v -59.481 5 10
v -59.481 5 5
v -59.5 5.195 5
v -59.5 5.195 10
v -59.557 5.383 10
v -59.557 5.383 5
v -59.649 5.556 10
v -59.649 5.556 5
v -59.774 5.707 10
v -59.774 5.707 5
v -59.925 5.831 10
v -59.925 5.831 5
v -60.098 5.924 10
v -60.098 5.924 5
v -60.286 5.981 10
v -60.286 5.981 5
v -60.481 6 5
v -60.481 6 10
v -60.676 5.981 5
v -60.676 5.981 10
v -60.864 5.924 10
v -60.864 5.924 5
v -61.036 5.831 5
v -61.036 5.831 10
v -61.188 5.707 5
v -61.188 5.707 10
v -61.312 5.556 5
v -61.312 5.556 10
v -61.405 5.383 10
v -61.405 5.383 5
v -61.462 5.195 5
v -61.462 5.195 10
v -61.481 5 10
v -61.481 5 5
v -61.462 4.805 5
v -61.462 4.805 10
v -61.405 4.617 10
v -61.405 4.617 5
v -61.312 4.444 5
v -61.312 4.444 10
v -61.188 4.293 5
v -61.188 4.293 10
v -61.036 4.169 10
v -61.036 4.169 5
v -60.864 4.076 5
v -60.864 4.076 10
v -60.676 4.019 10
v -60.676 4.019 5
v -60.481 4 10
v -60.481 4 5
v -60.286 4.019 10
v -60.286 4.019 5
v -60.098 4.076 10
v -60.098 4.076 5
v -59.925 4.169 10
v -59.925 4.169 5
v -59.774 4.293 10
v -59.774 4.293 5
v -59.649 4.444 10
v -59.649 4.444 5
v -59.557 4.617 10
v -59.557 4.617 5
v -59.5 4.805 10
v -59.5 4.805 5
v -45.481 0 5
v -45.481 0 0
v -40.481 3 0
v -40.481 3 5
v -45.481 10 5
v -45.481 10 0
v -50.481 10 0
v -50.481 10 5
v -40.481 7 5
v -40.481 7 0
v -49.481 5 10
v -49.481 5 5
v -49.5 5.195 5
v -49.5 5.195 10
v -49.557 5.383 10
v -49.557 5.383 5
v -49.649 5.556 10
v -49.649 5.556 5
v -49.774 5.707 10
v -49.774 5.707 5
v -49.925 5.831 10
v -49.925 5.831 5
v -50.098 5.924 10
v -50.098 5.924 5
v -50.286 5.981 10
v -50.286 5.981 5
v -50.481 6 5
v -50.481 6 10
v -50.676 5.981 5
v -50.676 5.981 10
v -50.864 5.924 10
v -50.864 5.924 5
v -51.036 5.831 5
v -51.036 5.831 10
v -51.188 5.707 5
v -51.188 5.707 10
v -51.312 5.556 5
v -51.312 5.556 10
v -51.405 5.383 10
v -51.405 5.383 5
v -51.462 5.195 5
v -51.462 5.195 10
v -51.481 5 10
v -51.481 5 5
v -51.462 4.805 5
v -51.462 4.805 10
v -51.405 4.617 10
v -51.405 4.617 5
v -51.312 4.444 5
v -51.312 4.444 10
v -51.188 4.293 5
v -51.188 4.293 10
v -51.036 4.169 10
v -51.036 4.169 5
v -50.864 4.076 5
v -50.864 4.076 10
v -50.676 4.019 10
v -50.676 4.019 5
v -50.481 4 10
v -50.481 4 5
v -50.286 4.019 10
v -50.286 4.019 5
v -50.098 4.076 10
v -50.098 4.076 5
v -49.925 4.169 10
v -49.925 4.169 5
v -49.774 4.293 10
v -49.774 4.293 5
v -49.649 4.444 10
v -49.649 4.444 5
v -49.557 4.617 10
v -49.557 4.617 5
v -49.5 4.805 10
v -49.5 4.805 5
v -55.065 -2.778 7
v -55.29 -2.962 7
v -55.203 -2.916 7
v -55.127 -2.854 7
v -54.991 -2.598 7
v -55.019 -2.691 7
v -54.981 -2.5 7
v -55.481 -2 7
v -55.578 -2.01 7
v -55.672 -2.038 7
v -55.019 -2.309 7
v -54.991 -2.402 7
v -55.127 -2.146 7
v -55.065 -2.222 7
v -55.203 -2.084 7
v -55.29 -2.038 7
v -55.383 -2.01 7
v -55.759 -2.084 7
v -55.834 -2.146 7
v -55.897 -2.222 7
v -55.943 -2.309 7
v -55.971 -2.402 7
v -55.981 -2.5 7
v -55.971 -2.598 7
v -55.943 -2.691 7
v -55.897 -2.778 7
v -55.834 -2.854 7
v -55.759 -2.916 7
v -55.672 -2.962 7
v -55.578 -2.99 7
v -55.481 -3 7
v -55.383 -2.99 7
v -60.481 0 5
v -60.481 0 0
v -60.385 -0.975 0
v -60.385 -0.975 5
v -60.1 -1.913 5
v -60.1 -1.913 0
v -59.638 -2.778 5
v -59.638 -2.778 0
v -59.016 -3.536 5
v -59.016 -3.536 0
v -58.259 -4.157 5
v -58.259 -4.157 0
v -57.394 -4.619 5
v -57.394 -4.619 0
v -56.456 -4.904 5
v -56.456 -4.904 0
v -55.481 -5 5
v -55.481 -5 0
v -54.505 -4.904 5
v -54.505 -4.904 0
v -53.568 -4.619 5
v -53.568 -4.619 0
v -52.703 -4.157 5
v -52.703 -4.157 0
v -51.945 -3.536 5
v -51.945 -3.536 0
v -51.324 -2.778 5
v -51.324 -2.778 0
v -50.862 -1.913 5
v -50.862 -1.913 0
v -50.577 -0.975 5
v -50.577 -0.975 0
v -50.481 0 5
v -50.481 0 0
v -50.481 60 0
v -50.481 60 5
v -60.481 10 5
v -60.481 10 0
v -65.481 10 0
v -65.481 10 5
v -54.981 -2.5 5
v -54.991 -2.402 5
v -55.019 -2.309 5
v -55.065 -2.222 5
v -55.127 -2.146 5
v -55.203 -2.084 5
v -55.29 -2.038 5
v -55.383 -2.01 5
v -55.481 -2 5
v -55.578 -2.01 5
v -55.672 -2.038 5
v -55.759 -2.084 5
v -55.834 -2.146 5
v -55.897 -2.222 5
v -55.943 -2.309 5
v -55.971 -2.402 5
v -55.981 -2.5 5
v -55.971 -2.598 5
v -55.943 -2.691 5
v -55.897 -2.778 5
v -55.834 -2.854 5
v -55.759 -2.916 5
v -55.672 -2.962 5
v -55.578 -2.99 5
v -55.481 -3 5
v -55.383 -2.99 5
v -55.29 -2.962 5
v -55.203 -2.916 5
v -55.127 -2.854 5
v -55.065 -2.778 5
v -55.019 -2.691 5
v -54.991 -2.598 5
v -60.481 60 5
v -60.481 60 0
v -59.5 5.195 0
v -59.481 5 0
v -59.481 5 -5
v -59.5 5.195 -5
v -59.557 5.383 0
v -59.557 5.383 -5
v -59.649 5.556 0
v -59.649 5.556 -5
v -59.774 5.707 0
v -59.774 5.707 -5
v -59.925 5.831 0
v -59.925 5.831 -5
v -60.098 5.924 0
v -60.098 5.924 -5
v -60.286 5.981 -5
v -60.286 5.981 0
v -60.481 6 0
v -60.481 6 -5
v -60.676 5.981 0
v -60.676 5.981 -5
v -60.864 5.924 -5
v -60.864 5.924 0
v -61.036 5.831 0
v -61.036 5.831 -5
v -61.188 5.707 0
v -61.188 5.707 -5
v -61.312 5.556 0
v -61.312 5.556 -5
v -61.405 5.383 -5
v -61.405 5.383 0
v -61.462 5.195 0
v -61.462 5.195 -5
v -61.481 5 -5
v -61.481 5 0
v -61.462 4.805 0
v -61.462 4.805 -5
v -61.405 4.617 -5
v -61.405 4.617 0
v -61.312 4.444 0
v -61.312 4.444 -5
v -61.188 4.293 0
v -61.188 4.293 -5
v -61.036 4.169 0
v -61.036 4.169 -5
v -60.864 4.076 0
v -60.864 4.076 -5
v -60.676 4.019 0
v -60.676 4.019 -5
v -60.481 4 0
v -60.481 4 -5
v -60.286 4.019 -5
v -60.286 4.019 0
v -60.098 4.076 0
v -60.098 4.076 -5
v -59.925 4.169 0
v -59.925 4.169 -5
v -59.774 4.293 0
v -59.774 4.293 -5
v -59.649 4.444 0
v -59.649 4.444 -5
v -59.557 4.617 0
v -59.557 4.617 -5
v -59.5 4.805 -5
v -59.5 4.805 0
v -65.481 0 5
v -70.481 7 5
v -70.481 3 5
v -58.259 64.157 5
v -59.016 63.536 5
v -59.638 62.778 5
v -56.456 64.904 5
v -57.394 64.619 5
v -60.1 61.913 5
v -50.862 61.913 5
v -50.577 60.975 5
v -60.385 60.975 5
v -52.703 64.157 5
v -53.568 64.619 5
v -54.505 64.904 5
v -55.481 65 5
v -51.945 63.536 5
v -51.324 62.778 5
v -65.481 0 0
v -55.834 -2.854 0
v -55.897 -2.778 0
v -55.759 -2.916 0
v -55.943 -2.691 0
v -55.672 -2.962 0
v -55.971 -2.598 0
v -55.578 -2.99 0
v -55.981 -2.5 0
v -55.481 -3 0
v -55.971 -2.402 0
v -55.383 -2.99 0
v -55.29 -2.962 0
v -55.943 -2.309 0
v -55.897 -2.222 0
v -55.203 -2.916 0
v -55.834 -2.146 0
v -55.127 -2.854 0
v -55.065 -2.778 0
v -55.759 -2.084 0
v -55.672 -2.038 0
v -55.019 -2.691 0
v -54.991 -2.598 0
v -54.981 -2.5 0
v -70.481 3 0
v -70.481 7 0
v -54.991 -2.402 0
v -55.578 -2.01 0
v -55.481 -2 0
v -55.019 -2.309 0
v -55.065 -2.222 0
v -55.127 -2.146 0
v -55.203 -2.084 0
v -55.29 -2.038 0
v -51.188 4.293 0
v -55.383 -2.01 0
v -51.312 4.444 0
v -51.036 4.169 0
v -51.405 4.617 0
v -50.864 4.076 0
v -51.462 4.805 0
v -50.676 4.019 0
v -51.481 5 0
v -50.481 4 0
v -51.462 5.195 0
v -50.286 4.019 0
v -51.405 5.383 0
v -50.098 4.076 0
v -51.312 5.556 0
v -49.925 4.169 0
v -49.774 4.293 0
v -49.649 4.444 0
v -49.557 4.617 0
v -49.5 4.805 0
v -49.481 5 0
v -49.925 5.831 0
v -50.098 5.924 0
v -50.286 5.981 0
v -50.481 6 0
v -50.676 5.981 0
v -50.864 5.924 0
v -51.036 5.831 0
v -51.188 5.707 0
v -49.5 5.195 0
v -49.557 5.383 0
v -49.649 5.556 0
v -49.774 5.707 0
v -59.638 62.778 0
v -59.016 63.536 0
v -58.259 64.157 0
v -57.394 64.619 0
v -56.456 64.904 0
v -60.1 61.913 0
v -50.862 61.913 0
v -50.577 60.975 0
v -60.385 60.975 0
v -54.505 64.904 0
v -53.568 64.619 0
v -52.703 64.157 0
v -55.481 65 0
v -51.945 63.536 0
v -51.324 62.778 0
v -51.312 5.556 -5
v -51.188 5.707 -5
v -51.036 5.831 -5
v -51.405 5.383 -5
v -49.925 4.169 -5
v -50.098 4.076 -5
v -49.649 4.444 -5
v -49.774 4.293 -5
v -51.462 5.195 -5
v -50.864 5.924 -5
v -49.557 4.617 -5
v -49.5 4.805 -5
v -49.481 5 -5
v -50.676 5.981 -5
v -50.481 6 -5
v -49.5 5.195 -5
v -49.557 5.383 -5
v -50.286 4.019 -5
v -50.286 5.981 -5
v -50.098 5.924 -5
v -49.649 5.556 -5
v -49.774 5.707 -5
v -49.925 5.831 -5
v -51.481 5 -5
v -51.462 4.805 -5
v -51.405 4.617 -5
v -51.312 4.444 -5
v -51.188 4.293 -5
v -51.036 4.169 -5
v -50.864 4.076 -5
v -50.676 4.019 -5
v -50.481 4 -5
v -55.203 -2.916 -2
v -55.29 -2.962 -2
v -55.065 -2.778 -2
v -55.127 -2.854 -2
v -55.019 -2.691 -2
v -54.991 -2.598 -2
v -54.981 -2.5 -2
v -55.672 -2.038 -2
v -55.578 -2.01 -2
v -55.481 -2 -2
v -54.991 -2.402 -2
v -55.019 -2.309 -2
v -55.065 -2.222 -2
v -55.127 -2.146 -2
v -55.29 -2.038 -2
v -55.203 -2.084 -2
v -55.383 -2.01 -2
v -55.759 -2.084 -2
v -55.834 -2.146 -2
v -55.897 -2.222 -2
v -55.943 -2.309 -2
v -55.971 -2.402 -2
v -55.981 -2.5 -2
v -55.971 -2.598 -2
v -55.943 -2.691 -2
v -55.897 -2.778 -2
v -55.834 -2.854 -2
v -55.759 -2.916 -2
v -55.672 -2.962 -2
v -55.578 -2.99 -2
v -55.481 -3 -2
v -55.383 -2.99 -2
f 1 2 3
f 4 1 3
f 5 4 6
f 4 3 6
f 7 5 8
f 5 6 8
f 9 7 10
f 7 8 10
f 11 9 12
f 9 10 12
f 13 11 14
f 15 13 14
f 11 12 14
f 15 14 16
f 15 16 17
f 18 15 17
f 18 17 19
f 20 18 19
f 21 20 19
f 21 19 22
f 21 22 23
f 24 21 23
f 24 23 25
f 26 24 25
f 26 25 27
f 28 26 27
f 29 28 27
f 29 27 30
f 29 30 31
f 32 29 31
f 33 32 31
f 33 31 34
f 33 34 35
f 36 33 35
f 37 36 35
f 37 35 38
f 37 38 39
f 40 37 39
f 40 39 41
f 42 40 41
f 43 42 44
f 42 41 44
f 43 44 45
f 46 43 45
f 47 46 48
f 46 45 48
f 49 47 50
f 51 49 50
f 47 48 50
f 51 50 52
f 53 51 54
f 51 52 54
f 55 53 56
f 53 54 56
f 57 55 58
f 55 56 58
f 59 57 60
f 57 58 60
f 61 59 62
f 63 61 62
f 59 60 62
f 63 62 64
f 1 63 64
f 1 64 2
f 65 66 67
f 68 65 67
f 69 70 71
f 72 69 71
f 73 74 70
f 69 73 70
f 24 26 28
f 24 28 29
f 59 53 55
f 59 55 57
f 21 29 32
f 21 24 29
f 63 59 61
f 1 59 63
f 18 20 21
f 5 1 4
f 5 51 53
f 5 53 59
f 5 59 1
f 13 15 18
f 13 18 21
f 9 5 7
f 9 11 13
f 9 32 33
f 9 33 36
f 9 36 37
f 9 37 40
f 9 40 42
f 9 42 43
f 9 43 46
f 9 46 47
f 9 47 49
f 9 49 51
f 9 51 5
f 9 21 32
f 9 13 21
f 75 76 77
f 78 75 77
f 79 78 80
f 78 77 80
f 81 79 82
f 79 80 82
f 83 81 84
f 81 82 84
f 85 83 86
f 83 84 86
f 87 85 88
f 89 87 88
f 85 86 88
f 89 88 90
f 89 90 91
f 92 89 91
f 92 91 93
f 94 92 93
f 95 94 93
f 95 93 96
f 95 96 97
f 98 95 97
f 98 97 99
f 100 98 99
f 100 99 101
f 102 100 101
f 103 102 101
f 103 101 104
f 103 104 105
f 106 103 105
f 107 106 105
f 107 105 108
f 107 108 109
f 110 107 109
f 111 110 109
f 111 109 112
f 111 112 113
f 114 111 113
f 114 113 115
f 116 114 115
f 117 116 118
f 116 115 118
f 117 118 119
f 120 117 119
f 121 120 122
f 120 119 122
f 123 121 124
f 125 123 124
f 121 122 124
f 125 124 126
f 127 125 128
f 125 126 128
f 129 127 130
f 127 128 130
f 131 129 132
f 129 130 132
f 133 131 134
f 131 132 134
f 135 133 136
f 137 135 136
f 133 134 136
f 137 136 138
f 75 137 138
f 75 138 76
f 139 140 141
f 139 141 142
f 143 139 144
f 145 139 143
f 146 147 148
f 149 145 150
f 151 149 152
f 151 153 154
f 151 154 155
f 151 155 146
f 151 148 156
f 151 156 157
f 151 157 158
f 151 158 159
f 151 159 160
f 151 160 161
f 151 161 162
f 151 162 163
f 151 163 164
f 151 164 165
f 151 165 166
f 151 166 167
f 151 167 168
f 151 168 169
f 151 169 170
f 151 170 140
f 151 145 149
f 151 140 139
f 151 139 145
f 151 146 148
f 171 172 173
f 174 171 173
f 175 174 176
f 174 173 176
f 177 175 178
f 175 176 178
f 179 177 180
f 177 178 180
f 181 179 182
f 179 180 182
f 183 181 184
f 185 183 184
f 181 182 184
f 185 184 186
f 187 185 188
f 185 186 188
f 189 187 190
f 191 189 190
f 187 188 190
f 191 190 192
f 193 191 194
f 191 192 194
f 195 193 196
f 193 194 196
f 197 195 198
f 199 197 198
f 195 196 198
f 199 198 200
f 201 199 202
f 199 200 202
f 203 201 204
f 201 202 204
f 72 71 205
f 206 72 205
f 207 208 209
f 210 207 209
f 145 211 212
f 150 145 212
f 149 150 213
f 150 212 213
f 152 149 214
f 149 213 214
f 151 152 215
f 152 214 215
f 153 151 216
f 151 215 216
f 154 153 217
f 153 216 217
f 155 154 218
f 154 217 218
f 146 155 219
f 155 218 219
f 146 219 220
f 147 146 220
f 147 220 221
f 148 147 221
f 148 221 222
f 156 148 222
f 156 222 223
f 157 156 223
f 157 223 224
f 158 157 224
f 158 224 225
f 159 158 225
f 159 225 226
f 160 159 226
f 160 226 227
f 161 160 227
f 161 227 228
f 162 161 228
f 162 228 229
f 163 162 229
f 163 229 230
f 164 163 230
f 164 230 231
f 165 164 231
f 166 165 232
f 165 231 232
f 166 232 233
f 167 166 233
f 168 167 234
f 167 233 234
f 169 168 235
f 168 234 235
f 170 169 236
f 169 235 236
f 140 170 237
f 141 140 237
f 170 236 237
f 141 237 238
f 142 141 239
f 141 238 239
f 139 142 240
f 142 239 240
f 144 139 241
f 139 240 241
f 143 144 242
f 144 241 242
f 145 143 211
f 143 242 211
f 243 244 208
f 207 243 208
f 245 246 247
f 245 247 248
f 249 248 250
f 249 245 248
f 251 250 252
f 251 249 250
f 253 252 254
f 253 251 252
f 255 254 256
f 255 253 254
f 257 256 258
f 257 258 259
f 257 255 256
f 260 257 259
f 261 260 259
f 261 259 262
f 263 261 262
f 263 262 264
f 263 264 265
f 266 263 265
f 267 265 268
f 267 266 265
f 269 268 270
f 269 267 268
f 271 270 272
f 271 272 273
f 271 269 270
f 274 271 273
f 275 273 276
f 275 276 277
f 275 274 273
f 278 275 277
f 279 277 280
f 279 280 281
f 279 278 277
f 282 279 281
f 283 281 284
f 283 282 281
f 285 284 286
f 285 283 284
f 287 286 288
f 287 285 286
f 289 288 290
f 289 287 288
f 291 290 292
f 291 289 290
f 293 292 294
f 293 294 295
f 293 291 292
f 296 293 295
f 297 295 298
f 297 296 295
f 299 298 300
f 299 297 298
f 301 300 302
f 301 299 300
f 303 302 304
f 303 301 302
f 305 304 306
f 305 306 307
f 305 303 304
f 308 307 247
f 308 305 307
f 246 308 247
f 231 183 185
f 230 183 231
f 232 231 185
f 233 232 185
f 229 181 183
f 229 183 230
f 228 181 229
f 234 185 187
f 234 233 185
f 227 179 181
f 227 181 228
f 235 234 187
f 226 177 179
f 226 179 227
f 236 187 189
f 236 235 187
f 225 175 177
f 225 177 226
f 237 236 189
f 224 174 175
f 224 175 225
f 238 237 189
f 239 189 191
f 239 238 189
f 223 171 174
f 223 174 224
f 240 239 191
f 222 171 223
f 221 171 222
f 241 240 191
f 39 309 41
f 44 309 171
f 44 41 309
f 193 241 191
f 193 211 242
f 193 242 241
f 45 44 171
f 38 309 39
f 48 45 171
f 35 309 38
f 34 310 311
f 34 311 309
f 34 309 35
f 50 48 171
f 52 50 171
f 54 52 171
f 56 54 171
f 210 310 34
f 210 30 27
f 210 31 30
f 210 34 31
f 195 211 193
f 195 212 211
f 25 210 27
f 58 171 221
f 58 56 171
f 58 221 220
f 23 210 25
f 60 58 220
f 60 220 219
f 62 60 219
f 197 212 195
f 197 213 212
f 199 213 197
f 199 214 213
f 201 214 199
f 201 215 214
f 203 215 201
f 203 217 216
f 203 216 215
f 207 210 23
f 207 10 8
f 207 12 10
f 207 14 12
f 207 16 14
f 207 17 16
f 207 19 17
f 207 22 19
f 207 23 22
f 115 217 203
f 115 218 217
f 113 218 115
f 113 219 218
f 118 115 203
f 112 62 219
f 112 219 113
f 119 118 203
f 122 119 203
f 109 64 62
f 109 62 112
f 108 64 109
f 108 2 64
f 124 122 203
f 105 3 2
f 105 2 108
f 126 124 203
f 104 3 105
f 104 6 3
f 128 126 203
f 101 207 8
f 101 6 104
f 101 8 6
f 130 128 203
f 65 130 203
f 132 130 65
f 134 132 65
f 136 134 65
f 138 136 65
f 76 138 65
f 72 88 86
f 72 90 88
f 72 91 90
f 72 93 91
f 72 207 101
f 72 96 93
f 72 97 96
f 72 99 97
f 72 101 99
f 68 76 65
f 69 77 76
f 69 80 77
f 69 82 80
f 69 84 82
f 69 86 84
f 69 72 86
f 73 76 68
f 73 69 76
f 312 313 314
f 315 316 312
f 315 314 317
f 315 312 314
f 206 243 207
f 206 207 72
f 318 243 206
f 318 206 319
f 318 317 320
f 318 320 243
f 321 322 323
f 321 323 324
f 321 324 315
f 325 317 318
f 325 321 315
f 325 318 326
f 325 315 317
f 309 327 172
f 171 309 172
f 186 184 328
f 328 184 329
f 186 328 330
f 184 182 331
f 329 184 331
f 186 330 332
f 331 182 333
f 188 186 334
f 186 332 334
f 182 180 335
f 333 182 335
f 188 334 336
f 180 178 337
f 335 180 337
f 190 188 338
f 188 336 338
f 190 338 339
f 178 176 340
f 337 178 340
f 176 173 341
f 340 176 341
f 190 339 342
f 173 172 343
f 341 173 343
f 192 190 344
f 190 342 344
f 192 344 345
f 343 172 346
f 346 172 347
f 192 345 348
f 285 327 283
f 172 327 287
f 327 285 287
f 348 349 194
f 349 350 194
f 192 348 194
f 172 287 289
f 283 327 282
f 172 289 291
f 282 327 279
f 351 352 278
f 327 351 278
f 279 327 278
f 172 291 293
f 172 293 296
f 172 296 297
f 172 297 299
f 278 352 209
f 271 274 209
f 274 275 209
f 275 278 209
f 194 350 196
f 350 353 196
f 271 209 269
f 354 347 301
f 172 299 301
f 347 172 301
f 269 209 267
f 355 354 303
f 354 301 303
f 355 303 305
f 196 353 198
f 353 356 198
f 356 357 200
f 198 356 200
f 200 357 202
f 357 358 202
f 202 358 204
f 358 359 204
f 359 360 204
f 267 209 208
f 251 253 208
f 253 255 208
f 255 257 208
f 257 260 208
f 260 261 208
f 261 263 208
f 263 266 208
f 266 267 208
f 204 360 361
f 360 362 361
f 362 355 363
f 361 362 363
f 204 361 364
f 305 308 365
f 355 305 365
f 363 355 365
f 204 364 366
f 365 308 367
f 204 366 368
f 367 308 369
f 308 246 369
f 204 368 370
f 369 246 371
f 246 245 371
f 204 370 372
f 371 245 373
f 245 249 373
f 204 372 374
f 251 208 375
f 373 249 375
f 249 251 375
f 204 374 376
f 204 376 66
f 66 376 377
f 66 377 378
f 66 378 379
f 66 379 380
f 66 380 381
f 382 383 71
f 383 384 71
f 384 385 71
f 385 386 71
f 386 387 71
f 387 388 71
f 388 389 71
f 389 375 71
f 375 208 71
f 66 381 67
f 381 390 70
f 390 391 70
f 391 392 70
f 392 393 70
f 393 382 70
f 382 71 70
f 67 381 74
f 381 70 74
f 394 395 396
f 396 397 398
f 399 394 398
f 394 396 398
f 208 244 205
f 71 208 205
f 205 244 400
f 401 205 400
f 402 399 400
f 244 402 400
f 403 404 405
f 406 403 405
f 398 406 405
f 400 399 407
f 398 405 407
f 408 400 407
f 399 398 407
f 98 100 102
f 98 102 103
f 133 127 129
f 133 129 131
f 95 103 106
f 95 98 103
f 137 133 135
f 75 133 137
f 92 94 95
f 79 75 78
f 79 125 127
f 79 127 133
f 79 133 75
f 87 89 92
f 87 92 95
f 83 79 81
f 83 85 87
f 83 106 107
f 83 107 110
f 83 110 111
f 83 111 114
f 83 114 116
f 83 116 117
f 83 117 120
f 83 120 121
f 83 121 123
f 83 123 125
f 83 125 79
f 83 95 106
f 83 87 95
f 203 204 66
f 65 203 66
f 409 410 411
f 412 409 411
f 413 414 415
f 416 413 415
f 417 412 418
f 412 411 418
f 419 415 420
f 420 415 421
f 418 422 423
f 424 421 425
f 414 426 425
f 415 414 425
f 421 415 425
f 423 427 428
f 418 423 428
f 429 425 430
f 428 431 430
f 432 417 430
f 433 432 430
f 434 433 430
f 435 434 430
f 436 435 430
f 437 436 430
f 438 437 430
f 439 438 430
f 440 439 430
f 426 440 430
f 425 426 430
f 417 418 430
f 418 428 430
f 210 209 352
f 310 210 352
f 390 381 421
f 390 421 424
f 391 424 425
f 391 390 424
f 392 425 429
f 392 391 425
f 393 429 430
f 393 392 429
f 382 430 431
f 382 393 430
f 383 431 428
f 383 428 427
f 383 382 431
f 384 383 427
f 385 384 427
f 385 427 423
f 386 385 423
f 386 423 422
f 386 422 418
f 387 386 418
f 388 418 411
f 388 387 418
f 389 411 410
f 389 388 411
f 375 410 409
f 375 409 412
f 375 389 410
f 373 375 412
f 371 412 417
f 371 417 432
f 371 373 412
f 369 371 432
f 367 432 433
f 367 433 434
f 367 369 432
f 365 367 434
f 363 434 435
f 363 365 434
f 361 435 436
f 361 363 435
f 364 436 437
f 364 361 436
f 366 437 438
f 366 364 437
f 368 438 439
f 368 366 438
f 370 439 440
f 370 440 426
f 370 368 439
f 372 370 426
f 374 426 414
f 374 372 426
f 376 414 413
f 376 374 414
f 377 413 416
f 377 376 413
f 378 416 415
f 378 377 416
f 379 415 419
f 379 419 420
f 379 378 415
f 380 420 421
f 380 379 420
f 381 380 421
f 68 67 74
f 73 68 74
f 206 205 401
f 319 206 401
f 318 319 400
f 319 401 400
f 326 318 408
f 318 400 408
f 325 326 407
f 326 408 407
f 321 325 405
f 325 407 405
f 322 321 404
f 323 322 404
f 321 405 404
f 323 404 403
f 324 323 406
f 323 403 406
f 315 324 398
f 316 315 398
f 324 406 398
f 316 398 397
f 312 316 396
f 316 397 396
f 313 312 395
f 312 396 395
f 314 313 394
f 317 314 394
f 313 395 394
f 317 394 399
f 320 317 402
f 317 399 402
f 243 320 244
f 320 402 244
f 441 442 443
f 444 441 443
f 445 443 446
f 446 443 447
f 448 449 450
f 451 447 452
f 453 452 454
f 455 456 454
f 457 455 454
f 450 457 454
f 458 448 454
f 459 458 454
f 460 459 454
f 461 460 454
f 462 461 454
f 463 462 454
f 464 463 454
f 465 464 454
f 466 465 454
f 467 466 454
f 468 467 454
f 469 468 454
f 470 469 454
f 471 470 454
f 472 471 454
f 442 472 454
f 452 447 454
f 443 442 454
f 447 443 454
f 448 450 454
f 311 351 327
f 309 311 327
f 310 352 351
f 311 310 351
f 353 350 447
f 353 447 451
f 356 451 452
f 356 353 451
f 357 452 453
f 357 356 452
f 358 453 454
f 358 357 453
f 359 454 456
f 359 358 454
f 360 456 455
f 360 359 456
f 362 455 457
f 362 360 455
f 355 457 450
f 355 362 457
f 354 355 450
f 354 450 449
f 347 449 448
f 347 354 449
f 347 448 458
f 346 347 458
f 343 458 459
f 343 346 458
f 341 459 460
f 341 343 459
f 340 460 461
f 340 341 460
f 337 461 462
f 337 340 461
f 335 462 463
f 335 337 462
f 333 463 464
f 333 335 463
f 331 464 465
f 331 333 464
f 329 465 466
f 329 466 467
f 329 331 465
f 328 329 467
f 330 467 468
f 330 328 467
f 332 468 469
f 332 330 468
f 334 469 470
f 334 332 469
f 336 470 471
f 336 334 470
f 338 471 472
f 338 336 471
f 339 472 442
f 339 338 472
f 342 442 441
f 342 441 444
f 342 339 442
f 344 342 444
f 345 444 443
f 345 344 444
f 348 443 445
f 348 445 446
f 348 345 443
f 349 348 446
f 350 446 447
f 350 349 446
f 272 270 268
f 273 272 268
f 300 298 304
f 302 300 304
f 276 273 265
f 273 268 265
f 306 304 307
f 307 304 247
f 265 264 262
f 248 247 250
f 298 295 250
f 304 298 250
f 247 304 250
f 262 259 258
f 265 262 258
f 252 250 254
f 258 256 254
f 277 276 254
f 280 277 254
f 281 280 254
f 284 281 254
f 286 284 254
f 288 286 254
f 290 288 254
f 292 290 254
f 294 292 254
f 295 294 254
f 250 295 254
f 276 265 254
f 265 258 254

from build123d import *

# Parameters (mm, degrees)
F0_R     = 1
F0_R_2   = 0.5
F1_DEPTH = 5
F2_DEPTH = 7
F3_DEPTH = 2
F4_DEPTH = 10
F5_DEPTH = 5


with BuildPart() as f1:
    # F0 (on Top) → F1 (new body)
    with BuildSketch(Plane.XY):
        with BuildLine():
            Line((-60.480928, 60), (-60.480928, 10))
            Line((-60.480928, 10), (-50.480928, 10))
            Line((-50.480928, 10), (-50.480928, 60))
            ThreePointArc((-50.480928, 60), (-55.480928, 65), (-60.480928, 60))
        make_face()
        Polygon((-50.480928, 10), (-60.480928, 10), (-65.480928, 10), (-70.480928, 7), (-70.480928, 3), (-65.480928, 0), (-60.480928, 0), (-50.480928, 0), (-45.480928, 0), (-40.480928, 3), (-40.480928, 7), (-45.480928, 10), align=None)
        with Locations((-60.480928, 5)):
            Circle(F0_R, mode=Mode.SUBTRACT)
        with Locations((-50.480928, 5)):
            Circle(F0_R, mode=Mode.SUBTRACT)
        with BuildLine():
            Line((-50.480928, 0), (-60.480928, 0))
            ThreePointArc((-60.480928, 0), (-55.480928, -5), (-50.480928, 0))
        make_face()
        with Locations((-55.480928, -2.5)):
            Circle(F0_R_2, mode=Mode.SUBTRACT)
        with Locations((-55.480928, -2.5)):
            Circle(F0_R_2)
    extrude(amount=F1_DEPTH)

    # F0 (on Top) → F2 (join)
    with BuildSketch(Plane.XY):
        with Locations((-55.480928, -2.5)):
            Circle(F0_R_2)
    extrude(amount=F2_DEPTH)

    # F0 (on Top) → F3 (join)
    with BuildSketch(Plane.XY):
        with Locations((-55.480928, -2.5)):
            Circle(F0_R_2)
    extrude(amount=-F3_DEPTH)

    # F0 (on Top) → F4 (join)
    with BuildSketch(Plane.XY):
        with Locations((-60.480928, 5)):
            Circle(F0_R)
        with Locations((-50.480928, 5)):
            Circle(F0_R)
    extrude(amount=F4_DEPTH)

    # F0 (on Top) → F5 (join)
    with BuildSketch(Plane.XY):
        with Locations((-50.480928, 5)):
            Circle(F0_R)
        with Locations((-60.480928, 5)):
            Circle(F0_R)
    extrude(amount=-F5_DEPTH)


solid = f1.part
